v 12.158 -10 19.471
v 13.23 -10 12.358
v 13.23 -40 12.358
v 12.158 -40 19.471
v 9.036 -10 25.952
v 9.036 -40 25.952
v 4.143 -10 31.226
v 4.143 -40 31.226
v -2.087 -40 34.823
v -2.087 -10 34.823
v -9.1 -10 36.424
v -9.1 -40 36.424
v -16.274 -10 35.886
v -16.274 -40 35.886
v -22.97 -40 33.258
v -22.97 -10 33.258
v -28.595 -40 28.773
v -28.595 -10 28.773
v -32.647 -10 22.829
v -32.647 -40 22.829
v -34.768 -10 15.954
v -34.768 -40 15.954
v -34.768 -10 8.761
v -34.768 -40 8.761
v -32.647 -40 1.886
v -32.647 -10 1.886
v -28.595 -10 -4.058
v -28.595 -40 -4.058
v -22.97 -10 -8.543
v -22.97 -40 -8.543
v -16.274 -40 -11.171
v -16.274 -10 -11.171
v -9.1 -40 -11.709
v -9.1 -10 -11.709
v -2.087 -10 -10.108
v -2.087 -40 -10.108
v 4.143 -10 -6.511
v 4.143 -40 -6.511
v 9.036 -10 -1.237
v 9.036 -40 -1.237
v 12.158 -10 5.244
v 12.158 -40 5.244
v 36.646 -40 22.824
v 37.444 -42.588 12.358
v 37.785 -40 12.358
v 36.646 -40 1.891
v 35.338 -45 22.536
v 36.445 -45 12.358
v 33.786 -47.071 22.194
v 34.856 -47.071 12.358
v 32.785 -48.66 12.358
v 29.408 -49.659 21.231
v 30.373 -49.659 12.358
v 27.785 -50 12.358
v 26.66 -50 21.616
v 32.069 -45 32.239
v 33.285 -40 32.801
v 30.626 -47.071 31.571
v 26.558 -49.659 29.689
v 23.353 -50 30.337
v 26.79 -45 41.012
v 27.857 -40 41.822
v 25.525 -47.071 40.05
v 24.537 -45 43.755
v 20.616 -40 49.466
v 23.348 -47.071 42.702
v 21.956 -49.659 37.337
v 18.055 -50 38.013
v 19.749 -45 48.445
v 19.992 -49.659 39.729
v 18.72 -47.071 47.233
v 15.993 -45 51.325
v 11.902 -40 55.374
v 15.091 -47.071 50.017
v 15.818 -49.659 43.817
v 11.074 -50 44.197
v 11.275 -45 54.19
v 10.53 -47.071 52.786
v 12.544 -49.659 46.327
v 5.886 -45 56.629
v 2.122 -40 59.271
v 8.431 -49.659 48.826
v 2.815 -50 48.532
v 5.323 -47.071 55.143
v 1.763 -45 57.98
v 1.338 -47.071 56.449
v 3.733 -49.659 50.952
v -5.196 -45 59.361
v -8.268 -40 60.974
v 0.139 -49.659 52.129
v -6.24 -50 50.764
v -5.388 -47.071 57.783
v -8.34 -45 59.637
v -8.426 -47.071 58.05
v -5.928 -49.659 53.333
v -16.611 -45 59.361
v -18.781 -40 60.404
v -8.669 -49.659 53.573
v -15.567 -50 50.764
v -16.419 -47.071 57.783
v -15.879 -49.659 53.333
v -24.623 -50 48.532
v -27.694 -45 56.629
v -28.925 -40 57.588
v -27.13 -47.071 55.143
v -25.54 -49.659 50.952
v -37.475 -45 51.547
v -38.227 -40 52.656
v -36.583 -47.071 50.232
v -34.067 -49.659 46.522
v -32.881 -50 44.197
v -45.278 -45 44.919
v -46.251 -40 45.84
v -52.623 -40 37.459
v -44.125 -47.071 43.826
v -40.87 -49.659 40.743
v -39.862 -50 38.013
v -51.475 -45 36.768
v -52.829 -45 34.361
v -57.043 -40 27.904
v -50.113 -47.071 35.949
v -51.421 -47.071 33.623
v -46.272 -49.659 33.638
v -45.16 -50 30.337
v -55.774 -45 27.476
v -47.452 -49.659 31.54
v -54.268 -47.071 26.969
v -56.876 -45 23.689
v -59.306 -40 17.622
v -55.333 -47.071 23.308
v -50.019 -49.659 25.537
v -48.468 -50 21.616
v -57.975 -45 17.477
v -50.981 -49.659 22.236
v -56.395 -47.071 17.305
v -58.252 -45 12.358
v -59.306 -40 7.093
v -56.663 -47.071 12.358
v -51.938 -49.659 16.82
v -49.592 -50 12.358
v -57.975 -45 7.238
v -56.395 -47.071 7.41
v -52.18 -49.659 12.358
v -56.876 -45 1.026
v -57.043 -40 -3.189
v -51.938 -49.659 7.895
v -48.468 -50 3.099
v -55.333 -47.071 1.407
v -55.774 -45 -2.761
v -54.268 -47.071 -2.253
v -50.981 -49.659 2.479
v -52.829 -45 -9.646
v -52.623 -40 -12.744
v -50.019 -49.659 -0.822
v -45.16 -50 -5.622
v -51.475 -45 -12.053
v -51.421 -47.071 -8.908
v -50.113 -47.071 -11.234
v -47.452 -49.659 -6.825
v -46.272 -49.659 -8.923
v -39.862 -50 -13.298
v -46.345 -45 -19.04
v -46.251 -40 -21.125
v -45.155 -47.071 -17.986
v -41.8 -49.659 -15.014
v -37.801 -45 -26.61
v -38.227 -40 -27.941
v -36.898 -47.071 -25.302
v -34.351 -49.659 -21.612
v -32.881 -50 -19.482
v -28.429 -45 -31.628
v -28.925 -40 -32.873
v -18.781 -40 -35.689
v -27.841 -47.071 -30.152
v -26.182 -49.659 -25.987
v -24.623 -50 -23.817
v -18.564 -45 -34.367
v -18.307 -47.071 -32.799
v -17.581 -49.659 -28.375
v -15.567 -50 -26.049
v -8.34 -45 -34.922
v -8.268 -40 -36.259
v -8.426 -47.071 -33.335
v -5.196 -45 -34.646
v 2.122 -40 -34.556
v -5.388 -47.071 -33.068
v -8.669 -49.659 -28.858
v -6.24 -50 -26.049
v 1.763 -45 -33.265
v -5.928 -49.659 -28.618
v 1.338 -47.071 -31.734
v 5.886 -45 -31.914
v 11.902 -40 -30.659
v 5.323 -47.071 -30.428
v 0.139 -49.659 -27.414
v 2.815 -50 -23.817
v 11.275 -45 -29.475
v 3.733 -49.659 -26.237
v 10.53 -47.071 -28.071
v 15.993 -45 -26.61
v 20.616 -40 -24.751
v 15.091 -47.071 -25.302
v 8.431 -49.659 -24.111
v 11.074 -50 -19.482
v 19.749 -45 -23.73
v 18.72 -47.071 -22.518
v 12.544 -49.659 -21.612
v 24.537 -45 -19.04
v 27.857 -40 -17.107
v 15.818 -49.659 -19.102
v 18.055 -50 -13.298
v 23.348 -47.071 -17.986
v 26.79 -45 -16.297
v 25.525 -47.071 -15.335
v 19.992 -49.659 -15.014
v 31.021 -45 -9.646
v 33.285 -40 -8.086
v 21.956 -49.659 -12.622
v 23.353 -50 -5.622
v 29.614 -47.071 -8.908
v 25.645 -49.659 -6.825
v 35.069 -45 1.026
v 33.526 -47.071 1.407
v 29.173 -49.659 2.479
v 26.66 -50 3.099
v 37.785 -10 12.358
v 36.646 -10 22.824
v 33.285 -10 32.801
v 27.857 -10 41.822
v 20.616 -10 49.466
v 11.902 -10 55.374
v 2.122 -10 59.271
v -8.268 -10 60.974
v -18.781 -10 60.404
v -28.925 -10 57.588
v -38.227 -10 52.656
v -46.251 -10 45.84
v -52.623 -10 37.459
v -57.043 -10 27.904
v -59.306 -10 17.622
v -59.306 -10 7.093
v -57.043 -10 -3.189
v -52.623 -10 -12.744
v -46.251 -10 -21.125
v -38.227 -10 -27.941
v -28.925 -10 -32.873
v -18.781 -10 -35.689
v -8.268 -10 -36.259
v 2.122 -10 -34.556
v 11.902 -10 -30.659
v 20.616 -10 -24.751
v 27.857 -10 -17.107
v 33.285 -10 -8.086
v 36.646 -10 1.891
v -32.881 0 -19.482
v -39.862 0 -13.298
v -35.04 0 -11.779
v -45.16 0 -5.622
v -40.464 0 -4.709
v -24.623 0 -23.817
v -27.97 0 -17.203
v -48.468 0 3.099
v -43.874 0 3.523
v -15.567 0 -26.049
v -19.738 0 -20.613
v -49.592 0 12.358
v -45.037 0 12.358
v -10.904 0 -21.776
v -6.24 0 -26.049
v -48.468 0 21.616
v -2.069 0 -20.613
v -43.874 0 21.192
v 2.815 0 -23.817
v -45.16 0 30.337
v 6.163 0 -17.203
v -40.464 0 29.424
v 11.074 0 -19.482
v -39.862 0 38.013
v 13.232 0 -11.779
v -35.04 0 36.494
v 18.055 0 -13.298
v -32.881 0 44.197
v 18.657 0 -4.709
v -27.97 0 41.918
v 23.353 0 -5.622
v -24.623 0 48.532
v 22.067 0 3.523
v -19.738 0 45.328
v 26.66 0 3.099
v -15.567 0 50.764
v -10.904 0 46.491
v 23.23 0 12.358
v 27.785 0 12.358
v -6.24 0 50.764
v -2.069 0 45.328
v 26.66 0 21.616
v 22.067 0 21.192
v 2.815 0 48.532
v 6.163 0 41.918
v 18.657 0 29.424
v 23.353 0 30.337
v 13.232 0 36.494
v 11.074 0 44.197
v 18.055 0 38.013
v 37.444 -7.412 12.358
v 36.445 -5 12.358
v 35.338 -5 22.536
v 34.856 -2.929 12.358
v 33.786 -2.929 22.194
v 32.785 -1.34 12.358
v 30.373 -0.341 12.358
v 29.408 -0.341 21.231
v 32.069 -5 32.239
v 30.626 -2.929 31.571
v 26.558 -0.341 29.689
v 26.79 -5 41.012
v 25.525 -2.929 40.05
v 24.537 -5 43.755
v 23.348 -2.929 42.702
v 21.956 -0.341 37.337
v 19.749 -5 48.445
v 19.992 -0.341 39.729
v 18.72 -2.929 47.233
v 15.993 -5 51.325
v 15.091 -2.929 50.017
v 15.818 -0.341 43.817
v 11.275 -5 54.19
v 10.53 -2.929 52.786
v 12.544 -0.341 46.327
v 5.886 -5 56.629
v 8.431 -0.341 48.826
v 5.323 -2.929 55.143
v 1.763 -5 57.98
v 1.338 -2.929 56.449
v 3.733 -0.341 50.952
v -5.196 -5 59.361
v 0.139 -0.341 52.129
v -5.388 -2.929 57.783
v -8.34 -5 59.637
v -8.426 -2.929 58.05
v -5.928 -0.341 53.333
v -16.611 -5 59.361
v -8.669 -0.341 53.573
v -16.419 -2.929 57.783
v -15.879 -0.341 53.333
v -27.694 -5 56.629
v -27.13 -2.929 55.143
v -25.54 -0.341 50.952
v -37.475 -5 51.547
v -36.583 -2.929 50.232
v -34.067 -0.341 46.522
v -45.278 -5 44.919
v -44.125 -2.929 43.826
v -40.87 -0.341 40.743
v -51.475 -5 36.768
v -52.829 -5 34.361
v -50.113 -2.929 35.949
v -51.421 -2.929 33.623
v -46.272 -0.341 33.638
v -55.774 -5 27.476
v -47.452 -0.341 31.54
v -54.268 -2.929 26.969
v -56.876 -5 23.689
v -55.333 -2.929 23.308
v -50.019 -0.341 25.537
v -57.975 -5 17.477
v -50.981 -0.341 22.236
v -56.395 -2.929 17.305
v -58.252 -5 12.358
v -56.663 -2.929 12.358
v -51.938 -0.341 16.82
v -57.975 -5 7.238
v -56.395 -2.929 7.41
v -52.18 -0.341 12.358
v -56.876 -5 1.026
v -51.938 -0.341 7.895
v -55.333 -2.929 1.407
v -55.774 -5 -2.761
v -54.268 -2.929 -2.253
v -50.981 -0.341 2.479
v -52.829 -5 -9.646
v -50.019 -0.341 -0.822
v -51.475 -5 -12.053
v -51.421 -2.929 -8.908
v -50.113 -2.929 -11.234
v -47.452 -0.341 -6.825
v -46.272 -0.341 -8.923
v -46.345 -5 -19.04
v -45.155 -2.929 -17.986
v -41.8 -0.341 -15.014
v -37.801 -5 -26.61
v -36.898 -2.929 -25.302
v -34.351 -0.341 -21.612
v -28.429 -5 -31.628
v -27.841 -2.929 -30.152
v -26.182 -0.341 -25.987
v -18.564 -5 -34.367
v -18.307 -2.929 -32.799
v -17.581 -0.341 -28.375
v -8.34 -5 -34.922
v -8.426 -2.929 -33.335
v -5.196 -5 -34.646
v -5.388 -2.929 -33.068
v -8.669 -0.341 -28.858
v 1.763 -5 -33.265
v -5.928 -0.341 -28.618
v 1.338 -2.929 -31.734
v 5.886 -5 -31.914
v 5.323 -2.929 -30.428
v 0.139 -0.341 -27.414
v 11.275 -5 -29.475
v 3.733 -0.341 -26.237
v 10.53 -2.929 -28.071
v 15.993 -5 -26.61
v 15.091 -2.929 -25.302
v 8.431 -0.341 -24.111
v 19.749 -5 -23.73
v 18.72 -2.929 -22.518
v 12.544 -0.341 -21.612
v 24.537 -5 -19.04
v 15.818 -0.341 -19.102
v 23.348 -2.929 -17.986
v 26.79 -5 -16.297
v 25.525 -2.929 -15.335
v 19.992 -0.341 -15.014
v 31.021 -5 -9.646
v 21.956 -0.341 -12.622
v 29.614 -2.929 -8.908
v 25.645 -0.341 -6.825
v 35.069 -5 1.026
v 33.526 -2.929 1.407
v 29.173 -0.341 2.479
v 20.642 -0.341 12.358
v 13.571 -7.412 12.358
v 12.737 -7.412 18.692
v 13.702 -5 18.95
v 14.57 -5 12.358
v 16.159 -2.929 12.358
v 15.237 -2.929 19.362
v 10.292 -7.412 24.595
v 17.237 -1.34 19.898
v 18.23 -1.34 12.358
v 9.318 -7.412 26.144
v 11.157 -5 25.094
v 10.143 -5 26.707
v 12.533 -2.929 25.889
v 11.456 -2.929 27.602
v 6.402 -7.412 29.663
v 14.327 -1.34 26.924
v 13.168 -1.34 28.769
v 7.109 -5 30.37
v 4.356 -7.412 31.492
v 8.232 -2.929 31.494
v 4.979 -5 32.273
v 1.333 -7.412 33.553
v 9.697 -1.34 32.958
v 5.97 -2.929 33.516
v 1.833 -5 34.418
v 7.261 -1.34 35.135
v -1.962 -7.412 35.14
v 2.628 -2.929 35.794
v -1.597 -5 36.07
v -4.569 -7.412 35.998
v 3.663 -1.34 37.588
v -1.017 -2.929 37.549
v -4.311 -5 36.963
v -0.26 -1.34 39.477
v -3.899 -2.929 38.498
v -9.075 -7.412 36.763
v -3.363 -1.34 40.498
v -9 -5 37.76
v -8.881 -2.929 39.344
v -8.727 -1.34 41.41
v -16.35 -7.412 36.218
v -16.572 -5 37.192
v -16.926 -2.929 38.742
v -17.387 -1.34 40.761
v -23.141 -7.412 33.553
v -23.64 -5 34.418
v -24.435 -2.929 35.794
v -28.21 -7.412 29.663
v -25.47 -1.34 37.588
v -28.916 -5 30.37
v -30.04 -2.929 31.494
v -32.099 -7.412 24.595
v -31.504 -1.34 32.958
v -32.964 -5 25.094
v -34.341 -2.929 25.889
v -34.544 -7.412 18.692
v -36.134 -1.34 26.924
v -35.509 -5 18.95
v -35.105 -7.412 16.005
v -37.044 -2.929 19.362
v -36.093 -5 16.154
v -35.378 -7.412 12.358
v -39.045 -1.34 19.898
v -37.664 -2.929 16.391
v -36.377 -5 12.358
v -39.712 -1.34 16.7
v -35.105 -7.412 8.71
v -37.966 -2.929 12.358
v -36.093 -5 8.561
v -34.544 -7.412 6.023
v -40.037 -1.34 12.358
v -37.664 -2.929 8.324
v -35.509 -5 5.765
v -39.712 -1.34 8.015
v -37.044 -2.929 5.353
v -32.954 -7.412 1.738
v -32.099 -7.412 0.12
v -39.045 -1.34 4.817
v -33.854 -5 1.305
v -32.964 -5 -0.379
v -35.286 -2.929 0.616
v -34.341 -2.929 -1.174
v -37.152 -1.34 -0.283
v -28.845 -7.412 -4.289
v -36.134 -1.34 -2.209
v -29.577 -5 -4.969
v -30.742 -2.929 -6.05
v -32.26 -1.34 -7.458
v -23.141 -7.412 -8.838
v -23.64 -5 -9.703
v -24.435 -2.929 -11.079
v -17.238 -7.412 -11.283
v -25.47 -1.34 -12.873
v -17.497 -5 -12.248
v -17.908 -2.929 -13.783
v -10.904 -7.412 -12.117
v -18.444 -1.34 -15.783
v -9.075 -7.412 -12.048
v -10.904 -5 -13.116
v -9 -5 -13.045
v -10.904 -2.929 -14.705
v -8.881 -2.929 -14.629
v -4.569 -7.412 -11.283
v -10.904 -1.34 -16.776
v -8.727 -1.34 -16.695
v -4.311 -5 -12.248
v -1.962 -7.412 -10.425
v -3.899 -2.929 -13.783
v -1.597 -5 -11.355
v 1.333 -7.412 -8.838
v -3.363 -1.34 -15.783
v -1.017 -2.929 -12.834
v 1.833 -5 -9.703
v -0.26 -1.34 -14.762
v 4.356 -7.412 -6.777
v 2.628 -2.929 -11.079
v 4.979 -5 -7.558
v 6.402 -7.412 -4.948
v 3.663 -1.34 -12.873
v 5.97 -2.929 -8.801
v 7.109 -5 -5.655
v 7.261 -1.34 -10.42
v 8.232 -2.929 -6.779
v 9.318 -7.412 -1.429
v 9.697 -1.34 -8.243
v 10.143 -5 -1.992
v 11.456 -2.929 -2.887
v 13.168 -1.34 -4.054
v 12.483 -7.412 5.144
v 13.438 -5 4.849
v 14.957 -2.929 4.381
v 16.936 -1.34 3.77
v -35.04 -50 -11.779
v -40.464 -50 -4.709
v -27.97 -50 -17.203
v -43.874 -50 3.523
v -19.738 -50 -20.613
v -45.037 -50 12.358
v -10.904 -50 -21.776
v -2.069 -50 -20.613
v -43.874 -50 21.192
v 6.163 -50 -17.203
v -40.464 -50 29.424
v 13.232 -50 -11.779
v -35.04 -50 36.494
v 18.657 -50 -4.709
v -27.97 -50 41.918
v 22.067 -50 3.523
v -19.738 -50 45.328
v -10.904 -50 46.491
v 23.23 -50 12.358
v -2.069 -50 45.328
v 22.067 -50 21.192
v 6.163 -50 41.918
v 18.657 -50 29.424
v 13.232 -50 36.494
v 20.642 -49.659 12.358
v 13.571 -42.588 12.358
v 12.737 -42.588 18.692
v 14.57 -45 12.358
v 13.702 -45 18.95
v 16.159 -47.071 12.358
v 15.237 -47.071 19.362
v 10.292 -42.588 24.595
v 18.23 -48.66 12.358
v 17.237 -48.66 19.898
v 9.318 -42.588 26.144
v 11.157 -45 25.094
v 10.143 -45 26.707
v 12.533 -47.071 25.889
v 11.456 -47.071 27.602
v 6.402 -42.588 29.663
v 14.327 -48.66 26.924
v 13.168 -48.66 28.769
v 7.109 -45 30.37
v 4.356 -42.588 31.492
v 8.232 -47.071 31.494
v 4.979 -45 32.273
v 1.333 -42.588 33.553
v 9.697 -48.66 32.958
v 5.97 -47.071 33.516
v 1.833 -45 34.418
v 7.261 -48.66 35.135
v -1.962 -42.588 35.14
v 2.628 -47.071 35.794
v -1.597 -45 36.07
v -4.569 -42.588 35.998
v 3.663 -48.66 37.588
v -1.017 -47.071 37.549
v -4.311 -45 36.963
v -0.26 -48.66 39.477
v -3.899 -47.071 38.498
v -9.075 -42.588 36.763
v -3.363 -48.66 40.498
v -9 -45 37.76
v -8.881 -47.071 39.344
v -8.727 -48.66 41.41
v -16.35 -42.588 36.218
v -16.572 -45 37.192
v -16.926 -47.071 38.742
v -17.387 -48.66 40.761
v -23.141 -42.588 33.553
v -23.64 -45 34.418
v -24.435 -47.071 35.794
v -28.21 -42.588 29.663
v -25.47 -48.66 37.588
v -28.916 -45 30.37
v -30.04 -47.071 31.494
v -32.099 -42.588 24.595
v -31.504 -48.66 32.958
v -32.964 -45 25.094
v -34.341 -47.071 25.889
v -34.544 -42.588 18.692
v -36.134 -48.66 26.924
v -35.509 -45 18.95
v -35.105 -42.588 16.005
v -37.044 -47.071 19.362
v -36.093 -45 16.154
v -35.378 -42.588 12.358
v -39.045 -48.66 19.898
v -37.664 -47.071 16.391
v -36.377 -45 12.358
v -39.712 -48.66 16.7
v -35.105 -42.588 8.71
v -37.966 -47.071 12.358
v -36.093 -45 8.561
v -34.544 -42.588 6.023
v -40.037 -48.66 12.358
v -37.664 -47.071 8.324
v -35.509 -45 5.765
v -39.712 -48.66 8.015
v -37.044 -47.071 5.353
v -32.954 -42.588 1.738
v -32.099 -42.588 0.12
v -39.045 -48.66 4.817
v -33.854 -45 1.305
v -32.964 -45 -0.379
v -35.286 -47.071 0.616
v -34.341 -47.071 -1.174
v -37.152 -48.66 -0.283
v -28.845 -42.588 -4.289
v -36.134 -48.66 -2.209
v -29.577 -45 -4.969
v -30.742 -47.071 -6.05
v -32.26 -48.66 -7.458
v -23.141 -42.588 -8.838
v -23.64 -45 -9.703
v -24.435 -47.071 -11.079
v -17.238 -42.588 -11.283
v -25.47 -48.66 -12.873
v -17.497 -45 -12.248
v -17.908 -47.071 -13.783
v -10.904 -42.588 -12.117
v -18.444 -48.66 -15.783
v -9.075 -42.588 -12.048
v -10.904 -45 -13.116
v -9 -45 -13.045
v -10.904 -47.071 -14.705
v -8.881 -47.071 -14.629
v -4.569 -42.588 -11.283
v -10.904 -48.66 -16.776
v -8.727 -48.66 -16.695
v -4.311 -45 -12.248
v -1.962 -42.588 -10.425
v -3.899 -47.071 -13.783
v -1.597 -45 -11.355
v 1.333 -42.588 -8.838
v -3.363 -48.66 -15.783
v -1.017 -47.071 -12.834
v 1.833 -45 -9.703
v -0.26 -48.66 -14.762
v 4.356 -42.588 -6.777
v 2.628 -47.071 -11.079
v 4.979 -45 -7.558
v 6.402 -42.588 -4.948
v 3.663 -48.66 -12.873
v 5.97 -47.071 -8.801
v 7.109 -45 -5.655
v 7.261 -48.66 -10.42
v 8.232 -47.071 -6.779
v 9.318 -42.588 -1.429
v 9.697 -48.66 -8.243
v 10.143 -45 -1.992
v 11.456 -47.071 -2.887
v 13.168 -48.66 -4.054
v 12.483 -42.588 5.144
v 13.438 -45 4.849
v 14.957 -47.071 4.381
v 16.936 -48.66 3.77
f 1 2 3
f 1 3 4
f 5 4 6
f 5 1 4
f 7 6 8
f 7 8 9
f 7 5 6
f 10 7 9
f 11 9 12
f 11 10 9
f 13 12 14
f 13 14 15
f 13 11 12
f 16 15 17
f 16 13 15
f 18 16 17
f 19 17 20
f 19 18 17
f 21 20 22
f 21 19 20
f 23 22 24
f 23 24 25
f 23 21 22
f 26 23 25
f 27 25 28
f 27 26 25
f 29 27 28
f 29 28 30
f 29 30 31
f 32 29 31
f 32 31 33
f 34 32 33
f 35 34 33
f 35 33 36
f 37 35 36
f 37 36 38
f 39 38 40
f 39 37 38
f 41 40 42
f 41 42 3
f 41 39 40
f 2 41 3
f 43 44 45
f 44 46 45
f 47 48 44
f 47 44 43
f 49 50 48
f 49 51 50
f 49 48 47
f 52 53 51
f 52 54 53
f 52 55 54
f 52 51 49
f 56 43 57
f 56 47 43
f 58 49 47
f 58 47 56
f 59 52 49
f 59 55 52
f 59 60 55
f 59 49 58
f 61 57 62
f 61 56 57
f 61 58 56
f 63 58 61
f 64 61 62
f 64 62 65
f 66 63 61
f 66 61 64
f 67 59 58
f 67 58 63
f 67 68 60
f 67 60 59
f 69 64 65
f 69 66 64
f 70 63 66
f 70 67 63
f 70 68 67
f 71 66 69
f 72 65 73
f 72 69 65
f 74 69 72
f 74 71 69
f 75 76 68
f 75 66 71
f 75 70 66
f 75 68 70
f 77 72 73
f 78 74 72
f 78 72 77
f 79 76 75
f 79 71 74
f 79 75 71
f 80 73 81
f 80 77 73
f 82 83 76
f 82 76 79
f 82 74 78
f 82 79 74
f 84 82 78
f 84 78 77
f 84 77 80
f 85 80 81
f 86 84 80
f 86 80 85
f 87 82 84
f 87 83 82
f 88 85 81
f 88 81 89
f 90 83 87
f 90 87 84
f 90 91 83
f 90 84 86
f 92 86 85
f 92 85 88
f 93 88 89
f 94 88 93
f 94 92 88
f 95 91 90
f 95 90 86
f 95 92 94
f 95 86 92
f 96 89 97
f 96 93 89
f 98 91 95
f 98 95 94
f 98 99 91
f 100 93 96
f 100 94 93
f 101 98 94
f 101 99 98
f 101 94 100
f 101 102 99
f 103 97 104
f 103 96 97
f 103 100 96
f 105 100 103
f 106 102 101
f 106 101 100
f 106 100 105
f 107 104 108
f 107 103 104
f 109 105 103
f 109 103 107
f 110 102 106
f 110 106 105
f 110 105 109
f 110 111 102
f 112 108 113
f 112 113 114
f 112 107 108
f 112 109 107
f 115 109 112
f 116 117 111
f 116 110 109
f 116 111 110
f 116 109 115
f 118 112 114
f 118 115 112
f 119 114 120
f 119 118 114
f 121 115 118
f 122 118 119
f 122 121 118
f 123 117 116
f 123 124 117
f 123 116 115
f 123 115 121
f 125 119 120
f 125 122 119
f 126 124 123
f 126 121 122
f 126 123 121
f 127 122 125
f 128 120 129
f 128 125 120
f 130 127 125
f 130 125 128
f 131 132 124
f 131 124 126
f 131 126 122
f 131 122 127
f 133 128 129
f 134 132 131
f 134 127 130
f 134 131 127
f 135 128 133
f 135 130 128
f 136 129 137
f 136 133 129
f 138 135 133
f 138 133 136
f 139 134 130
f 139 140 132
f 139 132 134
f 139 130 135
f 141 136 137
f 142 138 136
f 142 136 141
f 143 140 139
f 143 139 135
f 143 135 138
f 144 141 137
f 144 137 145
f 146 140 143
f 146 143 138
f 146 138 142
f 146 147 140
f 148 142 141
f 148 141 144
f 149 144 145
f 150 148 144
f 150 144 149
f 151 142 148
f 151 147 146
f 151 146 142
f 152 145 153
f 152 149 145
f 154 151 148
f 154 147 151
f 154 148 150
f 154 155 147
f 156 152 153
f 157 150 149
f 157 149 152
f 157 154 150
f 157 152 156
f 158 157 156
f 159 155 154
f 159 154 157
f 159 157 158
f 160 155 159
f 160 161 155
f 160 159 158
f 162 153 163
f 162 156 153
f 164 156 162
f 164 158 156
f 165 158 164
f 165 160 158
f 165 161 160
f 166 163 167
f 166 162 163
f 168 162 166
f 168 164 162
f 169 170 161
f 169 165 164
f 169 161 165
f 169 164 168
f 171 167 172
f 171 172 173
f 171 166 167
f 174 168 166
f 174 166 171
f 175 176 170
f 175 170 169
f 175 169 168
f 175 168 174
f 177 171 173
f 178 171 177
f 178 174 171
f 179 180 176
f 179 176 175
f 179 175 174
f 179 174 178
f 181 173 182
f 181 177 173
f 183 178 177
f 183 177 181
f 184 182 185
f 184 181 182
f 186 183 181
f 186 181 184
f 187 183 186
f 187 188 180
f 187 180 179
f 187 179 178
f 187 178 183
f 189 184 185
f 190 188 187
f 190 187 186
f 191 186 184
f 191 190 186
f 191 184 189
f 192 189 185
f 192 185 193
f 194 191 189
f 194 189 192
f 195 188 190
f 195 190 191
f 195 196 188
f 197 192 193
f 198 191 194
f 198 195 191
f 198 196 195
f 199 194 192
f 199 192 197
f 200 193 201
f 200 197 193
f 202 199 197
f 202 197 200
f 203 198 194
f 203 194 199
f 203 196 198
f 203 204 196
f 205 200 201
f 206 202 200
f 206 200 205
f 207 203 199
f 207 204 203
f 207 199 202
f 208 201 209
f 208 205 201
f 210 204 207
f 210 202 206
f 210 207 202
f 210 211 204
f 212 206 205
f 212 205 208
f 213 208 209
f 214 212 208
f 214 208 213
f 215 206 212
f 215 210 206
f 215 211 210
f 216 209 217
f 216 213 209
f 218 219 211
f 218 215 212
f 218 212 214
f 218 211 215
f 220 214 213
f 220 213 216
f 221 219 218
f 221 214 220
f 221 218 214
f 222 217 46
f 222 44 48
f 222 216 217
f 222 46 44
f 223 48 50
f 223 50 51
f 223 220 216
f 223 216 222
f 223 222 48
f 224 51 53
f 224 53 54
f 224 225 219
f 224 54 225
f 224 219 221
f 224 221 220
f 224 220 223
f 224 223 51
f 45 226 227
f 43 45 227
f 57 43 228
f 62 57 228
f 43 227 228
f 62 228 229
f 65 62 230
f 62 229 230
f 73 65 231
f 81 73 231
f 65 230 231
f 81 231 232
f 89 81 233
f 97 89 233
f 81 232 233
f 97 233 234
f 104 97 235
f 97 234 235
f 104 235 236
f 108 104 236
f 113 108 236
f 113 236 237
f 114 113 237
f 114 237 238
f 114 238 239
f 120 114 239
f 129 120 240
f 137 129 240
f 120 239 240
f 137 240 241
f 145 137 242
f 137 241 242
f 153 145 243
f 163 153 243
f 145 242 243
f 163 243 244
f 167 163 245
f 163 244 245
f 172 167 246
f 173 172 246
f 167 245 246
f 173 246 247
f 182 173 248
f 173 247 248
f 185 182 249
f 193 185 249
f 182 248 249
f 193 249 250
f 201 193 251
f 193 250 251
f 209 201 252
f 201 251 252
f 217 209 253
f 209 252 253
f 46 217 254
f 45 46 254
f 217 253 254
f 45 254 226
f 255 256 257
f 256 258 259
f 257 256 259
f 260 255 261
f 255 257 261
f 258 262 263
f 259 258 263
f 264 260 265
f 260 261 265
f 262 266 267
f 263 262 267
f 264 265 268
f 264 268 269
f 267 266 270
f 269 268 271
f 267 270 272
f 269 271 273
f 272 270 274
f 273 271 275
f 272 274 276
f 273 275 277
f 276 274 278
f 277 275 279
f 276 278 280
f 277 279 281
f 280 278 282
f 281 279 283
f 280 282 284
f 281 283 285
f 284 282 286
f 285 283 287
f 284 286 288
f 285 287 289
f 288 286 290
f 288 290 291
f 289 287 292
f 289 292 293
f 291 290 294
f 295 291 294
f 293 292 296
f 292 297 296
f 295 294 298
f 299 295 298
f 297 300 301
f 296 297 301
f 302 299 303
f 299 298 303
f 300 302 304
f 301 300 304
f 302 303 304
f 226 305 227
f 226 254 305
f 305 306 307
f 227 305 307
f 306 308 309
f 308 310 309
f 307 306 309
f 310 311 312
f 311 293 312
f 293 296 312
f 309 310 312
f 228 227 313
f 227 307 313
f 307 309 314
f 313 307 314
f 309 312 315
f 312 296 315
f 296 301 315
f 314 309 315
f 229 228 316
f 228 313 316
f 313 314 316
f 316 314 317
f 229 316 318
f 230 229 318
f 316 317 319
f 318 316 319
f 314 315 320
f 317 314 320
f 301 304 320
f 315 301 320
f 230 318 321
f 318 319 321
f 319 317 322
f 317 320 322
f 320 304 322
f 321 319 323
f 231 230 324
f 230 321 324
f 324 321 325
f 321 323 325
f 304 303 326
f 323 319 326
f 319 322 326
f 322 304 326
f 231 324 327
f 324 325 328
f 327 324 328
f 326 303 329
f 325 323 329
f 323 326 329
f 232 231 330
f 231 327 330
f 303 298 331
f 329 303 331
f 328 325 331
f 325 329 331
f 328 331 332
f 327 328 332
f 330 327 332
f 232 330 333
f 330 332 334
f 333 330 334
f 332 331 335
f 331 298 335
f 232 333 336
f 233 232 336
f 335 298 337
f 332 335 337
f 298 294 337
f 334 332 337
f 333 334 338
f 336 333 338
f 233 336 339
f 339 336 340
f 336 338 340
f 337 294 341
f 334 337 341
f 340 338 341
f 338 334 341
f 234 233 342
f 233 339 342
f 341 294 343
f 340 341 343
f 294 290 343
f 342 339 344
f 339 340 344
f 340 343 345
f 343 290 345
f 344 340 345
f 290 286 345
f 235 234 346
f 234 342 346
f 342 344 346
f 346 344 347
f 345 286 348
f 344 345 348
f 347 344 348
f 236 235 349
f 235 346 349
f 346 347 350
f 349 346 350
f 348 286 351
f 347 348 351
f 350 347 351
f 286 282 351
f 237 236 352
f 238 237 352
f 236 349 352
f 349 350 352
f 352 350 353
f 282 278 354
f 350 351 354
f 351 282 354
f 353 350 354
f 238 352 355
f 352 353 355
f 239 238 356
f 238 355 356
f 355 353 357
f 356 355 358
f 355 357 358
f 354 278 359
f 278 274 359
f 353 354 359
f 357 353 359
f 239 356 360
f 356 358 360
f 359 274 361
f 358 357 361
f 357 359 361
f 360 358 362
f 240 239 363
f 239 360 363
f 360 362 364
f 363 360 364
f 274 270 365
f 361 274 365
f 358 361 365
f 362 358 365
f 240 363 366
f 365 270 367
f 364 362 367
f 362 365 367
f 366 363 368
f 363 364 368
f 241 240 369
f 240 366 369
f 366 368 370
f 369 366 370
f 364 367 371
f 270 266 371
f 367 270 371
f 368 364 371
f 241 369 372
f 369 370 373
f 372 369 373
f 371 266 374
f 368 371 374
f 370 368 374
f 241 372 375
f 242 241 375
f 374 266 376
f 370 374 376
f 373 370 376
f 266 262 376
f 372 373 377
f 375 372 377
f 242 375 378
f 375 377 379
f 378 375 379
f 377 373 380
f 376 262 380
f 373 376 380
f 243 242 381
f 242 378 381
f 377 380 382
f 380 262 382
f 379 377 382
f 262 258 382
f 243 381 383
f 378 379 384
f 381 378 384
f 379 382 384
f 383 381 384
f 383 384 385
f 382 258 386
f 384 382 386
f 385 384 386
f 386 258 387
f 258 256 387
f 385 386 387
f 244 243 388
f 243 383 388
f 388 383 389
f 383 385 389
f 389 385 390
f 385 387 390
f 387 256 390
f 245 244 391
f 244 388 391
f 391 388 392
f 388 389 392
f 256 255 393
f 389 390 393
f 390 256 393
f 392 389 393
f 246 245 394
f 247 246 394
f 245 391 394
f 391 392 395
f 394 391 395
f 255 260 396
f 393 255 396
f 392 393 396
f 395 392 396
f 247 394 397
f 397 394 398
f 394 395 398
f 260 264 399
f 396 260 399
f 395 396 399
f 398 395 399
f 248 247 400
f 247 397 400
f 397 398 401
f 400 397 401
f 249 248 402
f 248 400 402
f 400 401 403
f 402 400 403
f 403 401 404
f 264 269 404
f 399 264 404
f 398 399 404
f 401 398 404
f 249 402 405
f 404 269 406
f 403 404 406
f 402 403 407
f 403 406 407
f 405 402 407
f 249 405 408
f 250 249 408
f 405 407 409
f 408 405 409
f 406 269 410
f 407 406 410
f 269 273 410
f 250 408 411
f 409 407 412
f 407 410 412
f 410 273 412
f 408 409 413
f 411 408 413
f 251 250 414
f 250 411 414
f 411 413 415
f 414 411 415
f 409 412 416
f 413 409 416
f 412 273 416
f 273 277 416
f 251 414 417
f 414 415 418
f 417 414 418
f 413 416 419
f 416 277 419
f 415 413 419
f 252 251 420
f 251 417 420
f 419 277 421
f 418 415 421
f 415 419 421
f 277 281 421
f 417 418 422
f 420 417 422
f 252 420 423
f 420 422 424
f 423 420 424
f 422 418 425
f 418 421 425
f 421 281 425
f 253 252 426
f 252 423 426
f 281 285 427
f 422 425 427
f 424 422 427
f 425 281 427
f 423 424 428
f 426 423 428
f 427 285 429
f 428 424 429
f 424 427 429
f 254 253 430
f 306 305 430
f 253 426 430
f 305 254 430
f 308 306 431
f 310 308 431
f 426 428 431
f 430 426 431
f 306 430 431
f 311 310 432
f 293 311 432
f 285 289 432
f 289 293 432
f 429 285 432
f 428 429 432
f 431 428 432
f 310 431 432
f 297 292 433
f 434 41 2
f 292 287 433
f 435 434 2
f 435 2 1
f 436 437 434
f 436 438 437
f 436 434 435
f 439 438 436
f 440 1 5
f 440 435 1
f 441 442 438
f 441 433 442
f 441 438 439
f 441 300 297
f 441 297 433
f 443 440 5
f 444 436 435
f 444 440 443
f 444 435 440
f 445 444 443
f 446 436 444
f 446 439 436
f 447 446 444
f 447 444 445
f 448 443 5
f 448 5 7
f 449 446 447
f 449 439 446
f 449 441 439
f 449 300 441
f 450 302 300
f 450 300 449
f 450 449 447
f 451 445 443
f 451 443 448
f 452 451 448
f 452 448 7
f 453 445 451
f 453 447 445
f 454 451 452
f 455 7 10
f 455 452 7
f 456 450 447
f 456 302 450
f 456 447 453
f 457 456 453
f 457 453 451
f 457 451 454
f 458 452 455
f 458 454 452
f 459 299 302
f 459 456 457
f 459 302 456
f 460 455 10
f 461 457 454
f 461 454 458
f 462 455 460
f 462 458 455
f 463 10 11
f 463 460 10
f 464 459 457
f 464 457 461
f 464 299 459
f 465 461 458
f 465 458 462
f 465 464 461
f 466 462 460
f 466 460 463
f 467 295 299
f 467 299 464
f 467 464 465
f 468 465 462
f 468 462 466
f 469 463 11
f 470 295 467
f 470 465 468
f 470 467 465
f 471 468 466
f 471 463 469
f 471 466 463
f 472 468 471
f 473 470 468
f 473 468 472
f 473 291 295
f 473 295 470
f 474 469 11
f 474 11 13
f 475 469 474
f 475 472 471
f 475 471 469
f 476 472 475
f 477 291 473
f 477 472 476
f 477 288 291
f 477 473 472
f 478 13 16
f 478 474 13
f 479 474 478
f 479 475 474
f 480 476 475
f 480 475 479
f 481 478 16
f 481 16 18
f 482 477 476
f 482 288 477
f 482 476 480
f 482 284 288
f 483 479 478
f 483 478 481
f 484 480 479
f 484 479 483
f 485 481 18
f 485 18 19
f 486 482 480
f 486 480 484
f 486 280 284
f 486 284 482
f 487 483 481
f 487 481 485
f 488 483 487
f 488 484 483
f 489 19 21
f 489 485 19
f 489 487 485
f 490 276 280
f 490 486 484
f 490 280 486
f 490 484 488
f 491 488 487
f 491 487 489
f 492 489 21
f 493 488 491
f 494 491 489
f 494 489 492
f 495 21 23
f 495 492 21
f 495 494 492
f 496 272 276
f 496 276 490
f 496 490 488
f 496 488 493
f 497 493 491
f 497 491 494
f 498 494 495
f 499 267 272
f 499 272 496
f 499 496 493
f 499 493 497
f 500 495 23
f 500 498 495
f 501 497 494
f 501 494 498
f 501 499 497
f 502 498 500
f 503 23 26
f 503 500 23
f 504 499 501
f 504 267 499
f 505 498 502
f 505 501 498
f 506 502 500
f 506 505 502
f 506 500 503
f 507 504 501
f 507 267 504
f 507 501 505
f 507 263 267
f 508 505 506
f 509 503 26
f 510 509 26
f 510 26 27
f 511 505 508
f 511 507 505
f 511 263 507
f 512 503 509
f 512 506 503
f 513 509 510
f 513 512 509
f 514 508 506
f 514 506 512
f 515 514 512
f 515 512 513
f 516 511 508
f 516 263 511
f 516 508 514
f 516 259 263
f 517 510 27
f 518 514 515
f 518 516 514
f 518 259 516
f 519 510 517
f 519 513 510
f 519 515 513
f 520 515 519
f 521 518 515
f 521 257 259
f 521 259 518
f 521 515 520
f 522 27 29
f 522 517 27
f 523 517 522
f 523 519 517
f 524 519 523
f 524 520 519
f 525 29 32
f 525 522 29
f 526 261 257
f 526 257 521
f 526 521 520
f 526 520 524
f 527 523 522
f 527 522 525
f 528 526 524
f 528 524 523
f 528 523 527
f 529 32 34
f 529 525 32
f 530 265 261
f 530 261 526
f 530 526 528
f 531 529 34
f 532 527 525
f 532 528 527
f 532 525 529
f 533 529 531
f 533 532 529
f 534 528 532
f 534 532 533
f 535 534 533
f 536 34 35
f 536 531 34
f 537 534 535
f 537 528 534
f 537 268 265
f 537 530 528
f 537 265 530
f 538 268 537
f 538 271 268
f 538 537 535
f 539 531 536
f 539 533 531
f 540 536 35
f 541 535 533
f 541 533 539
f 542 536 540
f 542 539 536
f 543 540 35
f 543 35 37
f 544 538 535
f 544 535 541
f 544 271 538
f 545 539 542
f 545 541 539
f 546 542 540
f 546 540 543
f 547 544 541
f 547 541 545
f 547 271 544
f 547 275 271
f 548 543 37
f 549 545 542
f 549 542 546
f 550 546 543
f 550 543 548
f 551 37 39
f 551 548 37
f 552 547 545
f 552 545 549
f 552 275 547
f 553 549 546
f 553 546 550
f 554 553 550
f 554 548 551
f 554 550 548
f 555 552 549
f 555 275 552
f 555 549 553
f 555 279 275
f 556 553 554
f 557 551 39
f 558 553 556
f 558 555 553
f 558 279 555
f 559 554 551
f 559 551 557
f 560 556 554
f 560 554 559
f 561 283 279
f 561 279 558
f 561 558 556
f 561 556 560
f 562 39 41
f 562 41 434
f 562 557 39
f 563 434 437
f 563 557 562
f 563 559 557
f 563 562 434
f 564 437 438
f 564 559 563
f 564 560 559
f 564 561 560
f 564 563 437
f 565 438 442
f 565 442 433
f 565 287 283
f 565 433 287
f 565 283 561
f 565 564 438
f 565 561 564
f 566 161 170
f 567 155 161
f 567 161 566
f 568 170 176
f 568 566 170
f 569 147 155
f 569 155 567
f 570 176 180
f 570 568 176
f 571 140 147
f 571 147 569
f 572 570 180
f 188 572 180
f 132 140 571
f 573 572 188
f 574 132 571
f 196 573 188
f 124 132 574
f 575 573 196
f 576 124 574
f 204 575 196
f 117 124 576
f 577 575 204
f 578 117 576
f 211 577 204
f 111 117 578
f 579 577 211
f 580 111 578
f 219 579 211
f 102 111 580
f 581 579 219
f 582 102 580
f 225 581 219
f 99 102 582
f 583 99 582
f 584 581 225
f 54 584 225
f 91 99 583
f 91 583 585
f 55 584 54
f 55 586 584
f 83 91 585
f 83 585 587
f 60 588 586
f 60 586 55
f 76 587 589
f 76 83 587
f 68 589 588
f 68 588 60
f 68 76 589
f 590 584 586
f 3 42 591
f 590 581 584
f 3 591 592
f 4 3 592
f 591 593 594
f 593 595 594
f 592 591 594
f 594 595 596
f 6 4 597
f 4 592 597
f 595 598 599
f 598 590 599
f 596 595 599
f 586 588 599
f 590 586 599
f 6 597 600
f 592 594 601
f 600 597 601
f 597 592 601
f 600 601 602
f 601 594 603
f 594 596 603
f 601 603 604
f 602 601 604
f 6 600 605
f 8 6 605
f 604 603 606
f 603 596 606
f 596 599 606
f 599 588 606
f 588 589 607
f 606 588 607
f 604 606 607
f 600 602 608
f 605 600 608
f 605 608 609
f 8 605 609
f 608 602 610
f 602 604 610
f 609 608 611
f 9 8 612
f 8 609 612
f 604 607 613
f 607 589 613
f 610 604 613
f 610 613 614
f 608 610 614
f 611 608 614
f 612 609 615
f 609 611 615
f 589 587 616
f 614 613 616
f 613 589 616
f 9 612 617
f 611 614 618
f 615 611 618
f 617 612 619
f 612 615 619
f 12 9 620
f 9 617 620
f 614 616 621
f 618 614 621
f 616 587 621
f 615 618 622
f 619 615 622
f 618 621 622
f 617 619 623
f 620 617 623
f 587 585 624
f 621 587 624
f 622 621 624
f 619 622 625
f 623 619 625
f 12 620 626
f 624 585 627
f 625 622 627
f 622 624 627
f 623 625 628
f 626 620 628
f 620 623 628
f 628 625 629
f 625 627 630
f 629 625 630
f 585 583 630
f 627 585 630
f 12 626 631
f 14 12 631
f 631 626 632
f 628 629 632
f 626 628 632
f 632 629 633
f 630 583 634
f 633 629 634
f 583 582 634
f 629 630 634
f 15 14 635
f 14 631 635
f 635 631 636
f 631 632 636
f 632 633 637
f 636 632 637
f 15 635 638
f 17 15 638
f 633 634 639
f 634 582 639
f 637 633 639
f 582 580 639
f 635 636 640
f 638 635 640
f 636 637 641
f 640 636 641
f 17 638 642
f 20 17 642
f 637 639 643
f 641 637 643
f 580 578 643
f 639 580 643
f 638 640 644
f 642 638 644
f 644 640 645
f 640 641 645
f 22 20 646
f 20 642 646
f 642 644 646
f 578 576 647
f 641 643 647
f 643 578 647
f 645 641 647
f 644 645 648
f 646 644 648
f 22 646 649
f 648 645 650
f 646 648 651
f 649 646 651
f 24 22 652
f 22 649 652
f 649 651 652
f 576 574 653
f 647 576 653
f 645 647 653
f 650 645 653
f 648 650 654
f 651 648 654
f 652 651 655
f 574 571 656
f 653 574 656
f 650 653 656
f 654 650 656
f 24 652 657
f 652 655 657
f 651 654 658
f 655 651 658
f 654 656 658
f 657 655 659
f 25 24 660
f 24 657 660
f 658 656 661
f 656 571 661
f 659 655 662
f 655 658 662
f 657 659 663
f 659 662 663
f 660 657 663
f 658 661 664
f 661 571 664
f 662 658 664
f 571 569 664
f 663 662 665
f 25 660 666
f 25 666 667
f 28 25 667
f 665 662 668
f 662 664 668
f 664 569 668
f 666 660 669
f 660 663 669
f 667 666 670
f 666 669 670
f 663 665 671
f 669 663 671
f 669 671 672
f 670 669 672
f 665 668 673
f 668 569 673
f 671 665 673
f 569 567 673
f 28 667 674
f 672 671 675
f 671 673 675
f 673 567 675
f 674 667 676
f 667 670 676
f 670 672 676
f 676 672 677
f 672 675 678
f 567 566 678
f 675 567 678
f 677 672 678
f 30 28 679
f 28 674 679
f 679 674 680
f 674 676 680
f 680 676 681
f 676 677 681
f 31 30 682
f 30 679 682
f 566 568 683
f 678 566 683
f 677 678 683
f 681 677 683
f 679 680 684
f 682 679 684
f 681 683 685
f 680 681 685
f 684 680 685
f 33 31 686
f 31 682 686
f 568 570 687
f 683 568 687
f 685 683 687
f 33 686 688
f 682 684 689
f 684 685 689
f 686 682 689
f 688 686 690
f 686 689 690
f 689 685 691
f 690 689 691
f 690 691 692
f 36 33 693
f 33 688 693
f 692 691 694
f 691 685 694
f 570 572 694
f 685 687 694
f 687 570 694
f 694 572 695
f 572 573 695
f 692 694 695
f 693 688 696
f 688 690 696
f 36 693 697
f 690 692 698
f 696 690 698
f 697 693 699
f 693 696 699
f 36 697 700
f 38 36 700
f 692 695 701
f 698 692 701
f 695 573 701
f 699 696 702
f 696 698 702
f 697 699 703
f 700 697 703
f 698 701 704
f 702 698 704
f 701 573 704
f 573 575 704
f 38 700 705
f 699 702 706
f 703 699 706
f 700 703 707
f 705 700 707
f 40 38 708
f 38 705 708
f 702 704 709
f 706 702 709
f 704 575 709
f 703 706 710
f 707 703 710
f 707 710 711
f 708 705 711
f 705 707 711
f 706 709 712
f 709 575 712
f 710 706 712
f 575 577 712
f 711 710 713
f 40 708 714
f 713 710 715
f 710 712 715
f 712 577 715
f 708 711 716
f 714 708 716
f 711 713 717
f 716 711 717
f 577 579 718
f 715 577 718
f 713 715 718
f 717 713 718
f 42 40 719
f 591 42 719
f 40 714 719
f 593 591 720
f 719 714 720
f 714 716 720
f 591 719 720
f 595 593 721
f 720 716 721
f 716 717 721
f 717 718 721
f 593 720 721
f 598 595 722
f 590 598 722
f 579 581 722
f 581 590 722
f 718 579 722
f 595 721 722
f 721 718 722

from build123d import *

# Parameters (mm, degrees)
F0_R     = 48.688201
F0_R_2   = 24.133595
F1_DEPTH = 50
F2_R     = 10


with BuildPart() as f1:
    # F0 (on Front) → F1 (new body)
    with BuildSketch(Plane.XZ):
        with Locations((-10.903678, 12.357511)):
            Circle(F0_R)
        with Locations((-10.903678, 12.357511)):
            Circle(F0_R_2, mode=Mode.SUBTRACT)
    extrude(amount=F1_DEPTH)

    # F2
    f2_edges = [f1.edges().sort_by_distance(p)[0] for p in [
        (-59.591879, 0, 12.357511),
        (-35.037273, 0, 12.357511),
        (-35.037273, -50, 12.357511),
        (13.229917, -25, 12.357511),
        (-59.591879, -50, 12.357511),
    ]]
    fillet(f2_edges, radius=F2_R)


solid = f1.part
